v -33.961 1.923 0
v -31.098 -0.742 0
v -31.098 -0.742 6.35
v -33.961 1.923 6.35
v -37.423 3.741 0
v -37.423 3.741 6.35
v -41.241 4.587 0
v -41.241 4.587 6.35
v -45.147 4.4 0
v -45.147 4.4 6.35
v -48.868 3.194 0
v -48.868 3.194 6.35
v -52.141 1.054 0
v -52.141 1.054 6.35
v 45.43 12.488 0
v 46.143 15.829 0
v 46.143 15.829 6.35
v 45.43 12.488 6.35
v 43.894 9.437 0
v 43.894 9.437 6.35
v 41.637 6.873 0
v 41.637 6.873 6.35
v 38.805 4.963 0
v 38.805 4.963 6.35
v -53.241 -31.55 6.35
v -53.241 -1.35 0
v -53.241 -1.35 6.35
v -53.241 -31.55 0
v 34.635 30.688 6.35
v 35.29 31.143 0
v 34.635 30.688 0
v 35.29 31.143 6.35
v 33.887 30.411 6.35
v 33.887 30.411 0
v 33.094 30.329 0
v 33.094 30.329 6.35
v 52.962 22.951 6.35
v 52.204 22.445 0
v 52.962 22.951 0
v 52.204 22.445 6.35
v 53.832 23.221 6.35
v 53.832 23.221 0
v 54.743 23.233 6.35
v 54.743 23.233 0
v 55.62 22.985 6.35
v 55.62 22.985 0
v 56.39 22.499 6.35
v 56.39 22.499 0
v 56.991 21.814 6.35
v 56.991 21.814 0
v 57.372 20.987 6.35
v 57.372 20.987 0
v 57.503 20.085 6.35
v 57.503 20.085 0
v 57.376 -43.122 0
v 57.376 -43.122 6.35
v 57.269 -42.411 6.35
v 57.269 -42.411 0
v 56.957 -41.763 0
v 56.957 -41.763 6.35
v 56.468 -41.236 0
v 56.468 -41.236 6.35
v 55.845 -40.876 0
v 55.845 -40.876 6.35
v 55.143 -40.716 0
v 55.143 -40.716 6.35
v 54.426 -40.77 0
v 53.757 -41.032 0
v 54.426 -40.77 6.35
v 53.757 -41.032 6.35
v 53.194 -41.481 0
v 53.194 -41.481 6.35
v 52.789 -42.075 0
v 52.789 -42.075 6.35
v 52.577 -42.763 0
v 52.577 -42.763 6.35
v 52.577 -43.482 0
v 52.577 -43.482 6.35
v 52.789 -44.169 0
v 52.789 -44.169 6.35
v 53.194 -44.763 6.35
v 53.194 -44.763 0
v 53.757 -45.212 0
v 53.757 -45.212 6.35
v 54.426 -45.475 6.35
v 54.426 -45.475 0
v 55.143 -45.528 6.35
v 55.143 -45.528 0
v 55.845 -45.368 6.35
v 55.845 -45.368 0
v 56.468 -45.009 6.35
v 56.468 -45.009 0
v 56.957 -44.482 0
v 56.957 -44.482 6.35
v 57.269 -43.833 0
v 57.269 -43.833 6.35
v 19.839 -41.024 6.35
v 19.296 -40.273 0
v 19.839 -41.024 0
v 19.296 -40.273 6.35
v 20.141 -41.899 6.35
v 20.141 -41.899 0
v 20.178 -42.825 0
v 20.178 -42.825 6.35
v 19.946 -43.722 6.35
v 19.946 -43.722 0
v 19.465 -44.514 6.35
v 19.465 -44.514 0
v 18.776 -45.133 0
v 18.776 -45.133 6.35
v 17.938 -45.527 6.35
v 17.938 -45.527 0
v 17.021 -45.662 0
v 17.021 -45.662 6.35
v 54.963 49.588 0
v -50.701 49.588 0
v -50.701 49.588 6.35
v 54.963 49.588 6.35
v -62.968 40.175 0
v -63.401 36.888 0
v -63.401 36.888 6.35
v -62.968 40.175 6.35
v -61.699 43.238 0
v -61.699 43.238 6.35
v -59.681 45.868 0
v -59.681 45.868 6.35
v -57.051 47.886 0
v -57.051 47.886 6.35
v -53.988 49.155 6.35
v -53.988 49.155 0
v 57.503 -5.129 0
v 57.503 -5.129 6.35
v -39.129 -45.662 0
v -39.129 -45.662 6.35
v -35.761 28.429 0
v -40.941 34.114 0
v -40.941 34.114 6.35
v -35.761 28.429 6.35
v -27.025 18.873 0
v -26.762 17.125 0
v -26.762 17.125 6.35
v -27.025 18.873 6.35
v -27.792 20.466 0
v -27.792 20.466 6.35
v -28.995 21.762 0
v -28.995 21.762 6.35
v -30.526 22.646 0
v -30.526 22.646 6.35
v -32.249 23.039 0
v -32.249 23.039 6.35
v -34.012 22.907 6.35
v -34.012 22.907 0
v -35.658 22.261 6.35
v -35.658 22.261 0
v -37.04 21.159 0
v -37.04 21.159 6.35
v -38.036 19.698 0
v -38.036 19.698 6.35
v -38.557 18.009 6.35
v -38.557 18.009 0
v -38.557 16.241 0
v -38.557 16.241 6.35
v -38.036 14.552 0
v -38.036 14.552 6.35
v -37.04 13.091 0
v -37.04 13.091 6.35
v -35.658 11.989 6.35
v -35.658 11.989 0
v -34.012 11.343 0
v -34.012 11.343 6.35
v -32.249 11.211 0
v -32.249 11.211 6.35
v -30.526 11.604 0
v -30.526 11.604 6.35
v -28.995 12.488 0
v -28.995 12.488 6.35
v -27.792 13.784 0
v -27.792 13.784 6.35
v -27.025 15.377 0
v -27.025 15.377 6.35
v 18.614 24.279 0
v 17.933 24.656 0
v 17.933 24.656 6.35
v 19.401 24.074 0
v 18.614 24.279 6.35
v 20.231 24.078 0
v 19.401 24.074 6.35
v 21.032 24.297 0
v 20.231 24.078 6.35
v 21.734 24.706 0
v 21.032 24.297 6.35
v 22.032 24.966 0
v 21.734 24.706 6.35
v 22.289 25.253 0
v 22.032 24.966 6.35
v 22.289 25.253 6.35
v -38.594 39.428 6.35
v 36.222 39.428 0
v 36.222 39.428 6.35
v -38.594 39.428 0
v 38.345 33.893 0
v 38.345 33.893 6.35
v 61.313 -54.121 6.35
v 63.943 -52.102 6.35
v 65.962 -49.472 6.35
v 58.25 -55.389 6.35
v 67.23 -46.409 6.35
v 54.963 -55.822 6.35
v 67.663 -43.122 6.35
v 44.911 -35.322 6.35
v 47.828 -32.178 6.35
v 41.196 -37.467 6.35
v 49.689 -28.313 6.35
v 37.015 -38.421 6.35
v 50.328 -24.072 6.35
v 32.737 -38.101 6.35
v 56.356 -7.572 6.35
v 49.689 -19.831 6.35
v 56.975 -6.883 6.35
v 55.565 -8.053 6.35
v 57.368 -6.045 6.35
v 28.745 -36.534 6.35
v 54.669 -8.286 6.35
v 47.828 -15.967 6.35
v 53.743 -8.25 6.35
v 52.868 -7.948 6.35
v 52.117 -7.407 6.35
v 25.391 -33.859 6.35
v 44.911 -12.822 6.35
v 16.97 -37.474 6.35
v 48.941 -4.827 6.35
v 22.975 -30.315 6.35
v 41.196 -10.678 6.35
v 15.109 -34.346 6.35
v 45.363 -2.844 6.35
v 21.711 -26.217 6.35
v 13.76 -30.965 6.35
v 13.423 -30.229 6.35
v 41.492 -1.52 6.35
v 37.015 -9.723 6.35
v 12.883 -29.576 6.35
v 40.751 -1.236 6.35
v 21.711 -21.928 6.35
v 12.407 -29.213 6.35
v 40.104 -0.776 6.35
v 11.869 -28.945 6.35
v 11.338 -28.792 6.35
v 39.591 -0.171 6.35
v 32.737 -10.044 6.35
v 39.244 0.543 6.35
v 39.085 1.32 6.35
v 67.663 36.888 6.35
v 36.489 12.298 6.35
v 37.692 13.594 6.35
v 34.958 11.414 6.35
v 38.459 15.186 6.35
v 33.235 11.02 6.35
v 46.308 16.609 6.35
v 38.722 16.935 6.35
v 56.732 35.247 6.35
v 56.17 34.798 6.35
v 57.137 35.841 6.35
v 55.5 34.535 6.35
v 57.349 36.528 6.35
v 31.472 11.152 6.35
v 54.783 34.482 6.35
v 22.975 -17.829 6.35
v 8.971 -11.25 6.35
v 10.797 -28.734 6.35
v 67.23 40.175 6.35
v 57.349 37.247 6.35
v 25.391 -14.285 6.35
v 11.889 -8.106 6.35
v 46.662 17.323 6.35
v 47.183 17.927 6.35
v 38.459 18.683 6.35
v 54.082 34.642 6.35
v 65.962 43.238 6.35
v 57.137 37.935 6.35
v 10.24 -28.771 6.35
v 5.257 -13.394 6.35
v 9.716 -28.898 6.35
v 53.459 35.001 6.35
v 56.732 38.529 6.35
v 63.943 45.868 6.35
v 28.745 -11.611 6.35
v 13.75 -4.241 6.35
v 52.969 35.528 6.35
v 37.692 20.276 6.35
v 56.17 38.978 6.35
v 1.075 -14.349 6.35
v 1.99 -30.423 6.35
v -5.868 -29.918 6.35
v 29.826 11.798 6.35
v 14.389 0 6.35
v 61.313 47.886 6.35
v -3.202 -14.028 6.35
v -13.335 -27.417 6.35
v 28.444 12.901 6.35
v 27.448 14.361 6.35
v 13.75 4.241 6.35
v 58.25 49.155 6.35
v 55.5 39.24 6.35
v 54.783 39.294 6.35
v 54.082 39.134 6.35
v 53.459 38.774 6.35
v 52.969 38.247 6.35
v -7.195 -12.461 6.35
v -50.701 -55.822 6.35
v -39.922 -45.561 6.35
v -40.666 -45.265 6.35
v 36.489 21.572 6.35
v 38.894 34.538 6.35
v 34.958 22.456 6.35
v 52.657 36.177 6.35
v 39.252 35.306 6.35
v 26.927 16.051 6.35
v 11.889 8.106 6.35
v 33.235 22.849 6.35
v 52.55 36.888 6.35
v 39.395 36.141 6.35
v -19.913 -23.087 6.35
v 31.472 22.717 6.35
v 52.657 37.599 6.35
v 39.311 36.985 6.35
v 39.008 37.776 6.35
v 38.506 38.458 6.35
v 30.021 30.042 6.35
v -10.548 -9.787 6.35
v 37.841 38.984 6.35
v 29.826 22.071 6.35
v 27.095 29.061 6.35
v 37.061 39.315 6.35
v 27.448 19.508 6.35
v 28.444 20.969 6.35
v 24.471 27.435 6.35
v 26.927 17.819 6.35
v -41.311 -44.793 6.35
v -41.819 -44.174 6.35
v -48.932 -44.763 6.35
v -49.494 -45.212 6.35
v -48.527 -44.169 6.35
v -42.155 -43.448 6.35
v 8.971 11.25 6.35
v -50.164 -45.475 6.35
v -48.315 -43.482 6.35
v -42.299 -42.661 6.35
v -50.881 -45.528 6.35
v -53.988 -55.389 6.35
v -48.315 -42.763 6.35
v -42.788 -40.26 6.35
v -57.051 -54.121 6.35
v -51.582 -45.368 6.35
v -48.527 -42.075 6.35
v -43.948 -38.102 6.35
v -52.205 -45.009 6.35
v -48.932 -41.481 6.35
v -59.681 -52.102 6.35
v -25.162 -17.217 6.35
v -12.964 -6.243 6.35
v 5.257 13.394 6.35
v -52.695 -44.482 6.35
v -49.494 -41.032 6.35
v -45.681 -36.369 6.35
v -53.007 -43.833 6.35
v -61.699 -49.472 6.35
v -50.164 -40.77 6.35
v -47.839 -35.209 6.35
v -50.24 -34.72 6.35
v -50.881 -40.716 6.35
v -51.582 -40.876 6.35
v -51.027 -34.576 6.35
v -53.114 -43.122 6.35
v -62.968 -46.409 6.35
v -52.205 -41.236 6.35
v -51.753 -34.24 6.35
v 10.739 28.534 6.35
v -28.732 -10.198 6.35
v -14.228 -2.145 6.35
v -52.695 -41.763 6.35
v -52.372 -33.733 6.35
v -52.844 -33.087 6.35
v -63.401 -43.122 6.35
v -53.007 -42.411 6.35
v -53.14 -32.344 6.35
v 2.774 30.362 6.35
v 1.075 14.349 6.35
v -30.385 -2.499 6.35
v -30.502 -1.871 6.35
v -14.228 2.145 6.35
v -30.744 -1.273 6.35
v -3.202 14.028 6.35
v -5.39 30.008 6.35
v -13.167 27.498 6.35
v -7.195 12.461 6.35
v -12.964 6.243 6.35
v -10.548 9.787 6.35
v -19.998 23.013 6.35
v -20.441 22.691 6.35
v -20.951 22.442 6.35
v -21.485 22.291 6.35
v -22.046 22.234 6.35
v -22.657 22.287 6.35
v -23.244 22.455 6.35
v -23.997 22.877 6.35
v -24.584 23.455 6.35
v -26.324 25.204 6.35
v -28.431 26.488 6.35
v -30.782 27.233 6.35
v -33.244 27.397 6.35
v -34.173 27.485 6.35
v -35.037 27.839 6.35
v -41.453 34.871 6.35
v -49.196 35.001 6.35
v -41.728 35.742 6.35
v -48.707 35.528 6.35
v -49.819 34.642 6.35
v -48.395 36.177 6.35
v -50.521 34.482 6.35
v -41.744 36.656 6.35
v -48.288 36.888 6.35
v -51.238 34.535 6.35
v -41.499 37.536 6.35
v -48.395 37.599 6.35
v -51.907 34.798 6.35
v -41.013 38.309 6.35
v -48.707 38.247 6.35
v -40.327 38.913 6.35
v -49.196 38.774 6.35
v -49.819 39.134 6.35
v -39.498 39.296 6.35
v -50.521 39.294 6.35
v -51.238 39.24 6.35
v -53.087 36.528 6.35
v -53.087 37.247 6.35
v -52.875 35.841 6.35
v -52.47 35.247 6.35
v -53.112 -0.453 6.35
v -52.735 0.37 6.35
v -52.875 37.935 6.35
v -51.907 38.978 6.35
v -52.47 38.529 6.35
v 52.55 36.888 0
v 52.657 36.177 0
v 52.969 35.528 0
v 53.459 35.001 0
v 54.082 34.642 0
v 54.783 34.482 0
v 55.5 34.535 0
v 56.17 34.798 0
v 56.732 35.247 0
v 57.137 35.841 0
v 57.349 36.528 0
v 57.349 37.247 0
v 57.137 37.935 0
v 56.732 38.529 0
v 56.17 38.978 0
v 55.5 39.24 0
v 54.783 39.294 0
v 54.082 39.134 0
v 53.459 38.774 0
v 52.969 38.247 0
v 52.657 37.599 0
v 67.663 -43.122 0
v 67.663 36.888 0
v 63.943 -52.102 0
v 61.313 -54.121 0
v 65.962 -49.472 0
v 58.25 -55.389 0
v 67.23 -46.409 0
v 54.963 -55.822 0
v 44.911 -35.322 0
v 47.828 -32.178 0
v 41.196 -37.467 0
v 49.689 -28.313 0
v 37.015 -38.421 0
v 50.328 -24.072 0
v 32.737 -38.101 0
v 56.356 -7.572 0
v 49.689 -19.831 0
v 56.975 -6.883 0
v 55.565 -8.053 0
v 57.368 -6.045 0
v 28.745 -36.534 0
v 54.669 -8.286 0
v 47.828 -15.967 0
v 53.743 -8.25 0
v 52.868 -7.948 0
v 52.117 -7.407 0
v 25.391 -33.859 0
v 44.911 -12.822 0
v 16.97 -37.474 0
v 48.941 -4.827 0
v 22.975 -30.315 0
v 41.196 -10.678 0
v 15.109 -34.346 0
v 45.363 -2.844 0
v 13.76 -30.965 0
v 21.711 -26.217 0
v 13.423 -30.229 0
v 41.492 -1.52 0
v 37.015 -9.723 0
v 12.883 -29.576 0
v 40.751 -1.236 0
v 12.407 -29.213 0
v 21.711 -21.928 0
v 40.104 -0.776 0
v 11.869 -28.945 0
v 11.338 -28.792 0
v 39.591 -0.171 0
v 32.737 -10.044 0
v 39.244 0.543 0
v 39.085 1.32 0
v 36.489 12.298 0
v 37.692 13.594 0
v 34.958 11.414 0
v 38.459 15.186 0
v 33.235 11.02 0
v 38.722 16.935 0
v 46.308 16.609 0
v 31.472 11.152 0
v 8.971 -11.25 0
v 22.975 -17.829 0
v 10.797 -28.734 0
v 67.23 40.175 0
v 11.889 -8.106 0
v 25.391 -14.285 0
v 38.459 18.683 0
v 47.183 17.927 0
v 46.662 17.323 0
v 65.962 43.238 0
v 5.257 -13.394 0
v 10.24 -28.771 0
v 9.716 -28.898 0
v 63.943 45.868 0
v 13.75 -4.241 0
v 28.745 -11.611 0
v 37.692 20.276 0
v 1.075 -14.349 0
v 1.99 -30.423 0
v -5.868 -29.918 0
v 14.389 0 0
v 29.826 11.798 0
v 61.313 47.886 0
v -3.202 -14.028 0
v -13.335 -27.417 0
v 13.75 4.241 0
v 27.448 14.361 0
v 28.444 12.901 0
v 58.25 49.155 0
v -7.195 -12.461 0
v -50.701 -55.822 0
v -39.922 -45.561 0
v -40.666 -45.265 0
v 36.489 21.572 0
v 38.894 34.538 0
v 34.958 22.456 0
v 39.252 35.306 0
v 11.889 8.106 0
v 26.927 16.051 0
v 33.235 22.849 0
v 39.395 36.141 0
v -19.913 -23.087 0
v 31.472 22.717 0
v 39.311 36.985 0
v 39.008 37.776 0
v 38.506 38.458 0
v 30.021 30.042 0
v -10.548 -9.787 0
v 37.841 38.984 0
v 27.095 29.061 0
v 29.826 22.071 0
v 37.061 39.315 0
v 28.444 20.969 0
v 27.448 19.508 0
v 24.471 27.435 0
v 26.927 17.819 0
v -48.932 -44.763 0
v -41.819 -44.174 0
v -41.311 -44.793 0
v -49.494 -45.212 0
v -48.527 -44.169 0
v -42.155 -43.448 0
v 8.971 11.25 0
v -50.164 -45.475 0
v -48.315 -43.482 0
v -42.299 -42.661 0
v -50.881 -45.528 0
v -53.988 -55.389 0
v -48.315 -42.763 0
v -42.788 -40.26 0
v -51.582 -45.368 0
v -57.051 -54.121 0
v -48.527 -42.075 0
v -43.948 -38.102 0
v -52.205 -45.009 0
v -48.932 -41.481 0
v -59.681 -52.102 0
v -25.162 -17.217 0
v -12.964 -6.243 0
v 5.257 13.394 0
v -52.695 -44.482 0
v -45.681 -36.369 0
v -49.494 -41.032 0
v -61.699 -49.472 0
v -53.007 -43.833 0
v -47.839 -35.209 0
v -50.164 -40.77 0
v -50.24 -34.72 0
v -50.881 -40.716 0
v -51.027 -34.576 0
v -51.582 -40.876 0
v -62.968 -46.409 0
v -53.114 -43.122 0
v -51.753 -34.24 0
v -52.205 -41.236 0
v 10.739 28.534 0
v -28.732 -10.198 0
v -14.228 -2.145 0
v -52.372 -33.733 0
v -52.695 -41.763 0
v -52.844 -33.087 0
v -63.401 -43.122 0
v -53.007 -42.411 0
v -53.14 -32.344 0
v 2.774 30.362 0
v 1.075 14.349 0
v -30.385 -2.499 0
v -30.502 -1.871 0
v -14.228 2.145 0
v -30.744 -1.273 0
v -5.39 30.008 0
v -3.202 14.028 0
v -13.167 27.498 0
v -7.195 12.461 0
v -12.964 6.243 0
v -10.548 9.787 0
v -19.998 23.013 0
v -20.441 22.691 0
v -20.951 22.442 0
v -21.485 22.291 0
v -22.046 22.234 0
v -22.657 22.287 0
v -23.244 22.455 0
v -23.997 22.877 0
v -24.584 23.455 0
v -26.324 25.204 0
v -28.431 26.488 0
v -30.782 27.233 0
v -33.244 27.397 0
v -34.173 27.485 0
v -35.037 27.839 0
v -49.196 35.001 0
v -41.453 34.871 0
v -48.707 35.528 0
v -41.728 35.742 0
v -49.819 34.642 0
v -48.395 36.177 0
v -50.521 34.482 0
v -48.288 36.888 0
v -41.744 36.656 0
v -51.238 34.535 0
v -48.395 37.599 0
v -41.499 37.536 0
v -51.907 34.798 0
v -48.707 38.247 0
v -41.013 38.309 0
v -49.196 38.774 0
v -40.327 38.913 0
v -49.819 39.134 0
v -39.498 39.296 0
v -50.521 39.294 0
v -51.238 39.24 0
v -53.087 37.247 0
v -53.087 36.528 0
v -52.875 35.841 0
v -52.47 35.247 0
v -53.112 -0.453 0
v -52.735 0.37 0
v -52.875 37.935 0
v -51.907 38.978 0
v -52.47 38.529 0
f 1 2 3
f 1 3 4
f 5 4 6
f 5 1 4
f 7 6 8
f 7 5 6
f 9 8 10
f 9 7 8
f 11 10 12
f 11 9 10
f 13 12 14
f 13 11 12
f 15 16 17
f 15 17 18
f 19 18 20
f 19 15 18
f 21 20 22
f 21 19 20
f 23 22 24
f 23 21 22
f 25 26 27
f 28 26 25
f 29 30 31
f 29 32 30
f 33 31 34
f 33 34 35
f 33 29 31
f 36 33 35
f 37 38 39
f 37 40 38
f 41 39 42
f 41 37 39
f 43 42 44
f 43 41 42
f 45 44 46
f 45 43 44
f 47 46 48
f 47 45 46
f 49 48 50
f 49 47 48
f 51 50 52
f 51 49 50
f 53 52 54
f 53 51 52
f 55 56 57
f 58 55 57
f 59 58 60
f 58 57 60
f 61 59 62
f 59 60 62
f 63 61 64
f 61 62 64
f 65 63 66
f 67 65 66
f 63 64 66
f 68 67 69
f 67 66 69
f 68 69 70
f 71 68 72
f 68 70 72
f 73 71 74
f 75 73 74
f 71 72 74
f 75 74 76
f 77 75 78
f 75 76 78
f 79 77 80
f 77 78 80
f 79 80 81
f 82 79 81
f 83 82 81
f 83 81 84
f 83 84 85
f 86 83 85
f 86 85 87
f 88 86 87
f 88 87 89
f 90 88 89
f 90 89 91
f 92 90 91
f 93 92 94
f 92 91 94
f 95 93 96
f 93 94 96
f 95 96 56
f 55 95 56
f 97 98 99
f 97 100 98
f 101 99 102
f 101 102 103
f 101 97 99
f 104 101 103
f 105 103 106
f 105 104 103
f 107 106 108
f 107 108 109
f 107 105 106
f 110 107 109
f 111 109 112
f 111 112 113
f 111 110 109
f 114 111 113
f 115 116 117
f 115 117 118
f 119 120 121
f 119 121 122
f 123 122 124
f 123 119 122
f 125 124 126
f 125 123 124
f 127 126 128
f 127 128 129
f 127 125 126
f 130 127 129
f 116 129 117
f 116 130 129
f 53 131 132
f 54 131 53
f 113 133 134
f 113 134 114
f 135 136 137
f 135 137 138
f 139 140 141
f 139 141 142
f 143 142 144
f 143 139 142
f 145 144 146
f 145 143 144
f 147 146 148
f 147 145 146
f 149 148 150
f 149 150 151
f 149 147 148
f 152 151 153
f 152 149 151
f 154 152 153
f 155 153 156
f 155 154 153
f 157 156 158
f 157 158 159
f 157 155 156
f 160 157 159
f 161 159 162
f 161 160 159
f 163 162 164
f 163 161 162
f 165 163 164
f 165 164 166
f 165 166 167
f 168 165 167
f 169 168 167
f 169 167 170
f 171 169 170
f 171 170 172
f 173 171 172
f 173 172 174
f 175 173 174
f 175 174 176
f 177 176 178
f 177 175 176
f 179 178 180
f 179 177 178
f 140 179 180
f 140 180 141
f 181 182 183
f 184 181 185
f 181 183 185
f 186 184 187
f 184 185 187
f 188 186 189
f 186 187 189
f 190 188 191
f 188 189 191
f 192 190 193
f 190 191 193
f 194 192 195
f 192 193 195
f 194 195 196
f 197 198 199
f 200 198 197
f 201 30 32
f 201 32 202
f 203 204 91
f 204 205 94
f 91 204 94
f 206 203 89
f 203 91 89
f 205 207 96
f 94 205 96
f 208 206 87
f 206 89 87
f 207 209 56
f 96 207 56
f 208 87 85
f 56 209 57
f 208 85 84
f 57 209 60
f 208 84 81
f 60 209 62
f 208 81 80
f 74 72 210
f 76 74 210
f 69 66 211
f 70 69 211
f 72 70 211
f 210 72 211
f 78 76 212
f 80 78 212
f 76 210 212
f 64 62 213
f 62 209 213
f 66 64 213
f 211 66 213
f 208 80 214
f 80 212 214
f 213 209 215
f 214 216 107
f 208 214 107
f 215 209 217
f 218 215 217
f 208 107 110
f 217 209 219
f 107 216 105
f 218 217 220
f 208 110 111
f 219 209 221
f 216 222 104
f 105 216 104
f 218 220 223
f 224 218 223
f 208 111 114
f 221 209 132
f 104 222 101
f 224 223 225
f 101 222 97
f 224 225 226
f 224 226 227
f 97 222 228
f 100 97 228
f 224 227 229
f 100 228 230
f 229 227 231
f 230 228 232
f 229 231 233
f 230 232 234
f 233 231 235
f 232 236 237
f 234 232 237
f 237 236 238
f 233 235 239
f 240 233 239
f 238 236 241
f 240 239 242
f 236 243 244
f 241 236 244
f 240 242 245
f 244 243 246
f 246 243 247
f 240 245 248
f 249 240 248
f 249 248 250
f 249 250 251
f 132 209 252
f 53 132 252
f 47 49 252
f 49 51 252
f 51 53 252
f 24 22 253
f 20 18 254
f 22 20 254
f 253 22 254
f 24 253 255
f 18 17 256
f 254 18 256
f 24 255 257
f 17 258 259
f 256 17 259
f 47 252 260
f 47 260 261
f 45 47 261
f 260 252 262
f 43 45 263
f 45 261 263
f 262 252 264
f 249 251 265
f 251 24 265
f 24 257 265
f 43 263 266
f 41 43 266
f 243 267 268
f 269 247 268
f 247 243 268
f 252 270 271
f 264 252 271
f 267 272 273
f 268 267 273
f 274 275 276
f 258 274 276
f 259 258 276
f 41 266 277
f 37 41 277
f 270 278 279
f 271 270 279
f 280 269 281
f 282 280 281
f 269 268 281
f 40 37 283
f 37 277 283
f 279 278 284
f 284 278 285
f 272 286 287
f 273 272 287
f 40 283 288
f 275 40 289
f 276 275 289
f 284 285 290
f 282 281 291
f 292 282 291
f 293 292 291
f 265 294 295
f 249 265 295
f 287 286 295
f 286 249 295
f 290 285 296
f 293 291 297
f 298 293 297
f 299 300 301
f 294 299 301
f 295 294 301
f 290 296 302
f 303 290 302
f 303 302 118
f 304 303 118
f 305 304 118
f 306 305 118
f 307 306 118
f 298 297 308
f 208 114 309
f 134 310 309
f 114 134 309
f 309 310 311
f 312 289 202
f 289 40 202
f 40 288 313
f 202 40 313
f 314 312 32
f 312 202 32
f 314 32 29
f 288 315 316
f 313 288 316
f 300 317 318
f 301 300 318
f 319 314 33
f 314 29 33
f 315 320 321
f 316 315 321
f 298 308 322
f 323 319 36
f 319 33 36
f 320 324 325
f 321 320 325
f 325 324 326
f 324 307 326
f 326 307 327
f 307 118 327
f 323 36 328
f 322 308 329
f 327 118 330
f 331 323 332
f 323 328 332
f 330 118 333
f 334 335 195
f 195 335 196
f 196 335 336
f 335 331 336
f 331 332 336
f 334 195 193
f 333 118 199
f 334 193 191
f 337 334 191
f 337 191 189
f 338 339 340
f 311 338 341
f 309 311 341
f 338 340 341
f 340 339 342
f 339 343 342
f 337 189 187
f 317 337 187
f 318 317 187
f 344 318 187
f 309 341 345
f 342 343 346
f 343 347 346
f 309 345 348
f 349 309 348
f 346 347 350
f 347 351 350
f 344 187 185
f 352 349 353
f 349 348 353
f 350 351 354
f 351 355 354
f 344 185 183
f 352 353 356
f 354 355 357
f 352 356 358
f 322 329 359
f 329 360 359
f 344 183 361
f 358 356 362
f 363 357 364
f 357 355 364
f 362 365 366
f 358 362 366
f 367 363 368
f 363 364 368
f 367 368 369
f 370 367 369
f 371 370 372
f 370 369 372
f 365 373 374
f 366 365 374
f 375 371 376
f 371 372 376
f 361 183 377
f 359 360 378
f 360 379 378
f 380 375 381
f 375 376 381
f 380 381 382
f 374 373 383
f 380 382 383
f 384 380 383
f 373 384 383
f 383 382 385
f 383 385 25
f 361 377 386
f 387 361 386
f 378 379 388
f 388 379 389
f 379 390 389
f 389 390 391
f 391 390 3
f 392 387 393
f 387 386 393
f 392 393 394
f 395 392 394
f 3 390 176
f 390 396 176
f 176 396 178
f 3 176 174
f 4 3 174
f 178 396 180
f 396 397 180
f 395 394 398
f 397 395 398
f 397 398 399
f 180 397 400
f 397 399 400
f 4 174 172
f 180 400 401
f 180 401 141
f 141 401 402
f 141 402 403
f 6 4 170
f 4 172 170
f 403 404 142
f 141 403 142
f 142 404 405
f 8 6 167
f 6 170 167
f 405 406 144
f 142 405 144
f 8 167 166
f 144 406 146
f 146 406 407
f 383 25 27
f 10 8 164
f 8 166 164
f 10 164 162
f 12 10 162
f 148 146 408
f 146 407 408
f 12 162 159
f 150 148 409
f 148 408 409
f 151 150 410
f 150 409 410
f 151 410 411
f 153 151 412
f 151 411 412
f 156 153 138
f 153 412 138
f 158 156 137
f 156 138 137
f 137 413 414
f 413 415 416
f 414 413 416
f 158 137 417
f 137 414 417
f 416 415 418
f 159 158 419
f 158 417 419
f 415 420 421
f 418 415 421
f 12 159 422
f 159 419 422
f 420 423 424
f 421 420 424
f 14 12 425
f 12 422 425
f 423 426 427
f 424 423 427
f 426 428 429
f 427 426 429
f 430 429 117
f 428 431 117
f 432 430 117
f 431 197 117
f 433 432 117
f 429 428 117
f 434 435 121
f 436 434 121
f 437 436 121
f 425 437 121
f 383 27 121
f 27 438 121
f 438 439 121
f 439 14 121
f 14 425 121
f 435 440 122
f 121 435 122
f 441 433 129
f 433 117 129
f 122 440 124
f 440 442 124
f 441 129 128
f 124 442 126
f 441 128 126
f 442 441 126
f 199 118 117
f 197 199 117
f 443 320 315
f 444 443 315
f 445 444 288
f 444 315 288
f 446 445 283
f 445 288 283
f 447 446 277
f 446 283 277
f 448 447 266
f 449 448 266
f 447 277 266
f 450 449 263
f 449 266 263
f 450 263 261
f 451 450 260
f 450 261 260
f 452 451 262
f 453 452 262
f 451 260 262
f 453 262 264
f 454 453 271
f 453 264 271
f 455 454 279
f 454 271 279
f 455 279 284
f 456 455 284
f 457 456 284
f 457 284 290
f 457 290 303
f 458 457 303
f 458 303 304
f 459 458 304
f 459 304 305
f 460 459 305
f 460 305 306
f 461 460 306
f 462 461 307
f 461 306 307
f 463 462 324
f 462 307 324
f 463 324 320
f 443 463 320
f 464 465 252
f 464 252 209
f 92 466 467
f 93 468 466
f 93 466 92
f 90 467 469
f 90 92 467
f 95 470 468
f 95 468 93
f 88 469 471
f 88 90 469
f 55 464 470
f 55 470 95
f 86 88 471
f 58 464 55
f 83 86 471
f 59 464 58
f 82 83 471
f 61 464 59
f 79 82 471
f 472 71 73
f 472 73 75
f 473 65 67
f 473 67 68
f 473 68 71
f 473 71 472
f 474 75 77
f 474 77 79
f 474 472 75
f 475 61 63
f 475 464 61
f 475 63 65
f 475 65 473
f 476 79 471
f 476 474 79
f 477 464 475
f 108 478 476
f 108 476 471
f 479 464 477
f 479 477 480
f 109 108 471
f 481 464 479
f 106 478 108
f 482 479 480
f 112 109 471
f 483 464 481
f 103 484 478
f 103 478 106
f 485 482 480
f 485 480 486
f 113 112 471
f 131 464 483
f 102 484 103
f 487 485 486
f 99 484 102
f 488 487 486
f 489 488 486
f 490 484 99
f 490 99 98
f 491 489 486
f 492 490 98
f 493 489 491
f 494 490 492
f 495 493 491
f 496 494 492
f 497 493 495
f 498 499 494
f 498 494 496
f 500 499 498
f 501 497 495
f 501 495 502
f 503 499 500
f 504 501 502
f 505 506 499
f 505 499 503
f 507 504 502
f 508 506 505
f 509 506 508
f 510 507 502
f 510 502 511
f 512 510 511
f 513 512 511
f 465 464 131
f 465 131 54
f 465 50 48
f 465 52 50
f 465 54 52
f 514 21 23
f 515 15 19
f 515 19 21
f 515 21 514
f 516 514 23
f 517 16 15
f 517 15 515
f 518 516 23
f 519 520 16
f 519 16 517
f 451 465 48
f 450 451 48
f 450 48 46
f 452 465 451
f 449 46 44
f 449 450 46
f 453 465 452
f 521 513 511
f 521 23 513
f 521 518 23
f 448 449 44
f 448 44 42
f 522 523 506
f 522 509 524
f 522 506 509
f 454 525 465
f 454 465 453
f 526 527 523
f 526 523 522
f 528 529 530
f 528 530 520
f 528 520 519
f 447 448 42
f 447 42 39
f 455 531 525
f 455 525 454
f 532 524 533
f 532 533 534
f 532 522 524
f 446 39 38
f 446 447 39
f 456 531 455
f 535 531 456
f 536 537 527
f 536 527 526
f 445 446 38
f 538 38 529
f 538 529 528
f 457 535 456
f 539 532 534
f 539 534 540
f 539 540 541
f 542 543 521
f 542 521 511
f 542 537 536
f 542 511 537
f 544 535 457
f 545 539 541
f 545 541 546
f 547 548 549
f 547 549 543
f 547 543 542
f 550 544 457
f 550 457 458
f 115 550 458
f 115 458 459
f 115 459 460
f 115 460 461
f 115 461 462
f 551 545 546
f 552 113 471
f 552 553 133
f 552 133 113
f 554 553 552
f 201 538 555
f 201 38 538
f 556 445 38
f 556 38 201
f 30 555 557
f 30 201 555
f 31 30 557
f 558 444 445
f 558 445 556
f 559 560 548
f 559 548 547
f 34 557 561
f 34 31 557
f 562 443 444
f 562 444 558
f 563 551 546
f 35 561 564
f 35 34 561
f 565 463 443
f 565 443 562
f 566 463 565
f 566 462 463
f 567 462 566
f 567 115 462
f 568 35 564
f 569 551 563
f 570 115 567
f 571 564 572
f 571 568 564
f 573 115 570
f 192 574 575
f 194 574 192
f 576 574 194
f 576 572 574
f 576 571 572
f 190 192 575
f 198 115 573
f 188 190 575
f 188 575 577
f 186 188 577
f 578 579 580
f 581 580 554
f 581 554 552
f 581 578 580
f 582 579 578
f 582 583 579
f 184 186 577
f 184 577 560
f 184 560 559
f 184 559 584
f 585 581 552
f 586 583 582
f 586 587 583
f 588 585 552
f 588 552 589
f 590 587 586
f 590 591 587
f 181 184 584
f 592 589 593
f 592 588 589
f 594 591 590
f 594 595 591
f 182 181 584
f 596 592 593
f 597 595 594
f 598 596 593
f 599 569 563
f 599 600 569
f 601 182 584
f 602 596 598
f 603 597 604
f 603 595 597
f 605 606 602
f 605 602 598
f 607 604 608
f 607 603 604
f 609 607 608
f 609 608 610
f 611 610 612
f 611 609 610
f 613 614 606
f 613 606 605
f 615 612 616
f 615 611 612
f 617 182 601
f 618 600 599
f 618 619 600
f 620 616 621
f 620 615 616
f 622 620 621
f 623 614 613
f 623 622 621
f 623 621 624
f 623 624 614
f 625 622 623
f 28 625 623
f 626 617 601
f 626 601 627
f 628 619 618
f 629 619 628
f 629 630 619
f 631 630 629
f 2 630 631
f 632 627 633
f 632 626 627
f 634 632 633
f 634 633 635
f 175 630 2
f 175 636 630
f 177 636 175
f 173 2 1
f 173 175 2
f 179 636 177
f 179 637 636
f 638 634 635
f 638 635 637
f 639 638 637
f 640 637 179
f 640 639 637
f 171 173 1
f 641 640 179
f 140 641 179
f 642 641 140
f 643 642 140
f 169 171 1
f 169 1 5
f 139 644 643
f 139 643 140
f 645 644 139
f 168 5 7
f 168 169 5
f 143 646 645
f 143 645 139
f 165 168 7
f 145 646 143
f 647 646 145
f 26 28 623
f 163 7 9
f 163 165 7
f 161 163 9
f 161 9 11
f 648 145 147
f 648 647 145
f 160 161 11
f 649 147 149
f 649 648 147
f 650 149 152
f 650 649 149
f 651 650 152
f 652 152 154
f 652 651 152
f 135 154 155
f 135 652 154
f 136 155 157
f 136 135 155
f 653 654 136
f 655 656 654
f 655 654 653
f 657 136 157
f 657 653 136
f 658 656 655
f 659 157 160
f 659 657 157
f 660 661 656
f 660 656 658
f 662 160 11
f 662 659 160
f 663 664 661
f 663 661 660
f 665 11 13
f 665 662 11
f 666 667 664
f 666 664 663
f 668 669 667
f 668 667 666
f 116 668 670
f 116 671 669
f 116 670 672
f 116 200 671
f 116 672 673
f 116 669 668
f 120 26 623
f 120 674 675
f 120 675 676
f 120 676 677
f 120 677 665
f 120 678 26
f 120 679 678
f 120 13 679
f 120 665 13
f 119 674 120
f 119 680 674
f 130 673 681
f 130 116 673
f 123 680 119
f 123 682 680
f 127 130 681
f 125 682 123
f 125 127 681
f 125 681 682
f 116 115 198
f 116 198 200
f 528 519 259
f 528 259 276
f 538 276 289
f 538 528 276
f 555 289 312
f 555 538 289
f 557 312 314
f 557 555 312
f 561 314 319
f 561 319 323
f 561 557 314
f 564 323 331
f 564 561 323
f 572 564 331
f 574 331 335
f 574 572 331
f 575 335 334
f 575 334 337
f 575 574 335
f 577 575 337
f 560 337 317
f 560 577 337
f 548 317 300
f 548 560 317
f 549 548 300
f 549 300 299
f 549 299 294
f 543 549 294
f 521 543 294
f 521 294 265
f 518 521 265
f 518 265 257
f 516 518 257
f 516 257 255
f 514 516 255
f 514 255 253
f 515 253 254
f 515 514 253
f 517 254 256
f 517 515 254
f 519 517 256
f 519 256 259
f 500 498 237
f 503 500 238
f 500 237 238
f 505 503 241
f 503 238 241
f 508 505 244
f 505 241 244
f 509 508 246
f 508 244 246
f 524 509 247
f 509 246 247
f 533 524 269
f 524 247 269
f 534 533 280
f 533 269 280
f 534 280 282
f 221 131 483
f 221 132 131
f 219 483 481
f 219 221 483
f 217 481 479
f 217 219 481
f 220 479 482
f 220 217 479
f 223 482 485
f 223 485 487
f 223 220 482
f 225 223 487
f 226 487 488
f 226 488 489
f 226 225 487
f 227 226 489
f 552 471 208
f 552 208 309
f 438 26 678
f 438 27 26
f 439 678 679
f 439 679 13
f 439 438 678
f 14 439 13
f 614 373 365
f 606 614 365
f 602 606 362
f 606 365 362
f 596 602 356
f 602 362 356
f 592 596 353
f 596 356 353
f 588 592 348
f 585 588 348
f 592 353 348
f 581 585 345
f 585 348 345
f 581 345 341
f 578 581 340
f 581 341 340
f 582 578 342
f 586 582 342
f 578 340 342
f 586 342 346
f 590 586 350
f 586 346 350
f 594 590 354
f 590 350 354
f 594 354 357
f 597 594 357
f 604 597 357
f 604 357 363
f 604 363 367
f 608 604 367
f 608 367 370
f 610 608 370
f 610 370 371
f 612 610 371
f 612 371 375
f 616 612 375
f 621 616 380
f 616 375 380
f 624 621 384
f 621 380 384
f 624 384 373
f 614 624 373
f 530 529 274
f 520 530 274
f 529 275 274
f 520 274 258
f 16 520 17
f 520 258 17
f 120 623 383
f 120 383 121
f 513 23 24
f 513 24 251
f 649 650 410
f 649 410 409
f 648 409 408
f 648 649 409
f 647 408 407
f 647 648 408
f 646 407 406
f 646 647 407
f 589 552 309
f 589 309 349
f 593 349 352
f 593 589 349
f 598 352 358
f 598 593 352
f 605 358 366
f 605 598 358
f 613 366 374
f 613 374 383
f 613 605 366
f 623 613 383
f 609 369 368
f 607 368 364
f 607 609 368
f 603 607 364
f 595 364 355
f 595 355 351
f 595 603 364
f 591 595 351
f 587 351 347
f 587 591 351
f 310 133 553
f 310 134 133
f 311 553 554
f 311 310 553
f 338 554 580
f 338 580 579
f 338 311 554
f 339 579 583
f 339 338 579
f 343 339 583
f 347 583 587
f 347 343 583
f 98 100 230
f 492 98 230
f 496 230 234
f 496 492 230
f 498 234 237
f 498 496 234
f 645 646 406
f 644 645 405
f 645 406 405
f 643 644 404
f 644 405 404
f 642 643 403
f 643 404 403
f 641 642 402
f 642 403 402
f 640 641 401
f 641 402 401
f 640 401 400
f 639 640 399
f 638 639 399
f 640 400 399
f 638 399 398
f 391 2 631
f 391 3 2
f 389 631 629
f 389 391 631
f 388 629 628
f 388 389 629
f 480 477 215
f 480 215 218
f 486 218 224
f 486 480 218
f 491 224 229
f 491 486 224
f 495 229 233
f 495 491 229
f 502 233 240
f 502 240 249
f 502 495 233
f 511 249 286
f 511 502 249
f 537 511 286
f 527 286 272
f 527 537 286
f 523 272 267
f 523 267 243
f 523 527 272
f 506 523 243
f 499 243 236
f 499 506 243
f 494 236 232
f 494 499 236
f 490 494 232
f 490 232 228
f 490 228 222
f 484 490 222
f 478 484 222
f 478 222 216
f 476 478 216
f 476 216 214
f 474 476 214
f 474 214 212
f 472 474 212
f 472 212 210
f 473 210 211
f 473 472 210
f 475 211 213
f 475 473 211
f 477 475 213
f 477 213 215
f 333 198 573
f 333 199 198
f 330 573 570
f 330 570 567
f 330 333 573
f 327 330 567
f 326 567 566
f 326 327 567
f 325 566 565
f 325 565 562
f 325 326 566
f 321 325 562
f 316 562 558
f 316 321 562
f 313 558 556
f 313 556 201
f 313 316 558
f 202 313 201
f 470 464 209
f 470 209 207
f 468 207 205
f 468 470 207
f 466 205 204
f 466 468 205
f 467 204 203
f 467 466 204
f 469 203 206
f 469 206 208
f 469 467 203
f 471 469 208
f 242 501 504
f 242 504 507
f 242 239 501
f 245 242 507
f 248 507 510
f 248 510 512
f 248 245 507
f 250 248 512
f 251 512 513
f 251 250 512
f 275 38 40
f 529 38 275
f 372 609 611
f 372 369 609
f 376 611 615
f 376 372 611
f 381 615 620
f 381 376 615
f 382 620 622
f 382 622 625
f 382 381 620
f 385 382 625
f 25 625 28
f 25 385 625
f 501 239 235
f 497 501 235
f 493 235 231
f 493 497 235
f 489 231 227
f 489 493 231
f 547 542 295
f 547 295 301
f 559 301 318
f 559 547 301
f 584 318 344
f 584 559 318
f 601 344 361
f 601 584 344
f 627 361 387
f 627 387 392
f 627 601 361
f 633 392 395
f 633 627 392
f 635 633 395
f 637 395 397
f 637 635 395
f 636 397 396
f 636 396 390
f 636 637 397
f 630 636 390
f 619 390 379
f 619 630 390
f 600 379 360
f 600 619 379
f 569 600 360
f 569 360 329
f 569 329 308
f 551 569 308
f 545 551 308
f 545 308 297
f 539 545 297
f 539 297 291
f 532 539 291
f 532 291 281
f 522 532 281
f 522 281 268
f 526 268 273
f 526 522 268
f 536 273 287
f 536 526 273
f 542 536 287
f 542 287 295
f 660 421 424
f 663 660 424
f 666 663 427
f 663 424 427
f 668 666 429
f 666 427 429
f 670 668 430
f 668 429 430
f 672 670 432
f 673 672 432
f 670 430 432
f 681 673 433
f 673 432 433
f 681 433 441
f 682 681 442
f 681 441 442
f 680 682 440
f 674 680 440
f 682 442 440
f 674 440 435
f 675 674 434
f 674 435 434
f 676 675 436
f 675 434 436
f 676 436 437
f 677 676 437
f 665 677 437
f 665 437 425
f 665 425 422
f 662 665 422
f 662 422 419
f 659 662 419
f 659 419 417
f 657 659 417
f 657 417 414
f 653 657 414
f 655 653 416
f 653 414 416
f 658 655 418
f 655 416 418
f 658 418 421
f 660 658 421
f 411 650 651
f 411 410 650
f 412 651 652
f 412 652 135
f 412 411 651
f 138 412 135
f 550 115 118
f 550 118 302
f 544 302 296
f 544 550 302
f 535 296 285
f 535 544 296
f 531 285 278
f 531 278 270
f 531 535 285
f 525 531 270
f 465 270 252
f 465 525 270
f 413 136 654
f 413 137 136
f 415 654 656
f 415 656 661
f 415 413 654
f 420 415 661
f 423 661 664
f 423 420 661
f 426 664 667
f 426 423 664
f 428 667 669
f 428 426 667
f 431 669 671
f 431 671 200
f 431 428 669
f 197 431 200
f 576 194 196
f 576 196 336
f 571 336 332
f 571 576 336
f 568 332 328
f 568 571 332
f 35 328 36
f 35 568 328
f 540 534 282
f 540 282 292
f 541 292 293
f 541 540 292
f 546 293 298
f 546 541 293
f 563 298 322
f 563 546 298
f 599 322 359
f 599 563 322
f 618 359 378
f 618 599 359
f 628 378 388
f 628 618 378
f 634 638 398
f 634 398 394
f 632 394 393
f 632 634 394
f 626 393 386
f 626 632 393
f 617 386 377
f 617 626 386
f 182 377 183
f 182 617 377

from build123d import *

# Parameters (mm, degrees)
SKETCH1_R           = 14.3891
SKETCH1_R_2         = 5.9309
BOSS_EXTRUDE2_DEPTH = 6.35
SKETCH2_R           = 2.413
CUT_EXTRUDE1_DEPTH  = 6.35
CUT_EXTRUDE6_DEPTH  = 25.4
FILLET4_R           = 3.175
FILLET6_R           = 3.175
FILLET5_R           = 3.175


with BuildPart() as part:
    # Sketch1 → Boss-Extrude2 (new body)
    with BuildSketch(Plane.XY):
        with BuildLine():
            Line((54.963119593, 49.587781591), (-50.700880407, 49.587781591))
            ThreePointArc((-50.700880407, 49.587781591), (-59.681136528, 45.868037712), (-63.400880407, 36.887781591))
            Line((-63.400880407, 36.887781591), (-63.400880407, -43.122218409))
            ThreePointArc((-63.400880407, -43.122218409), (-59.681136528, -52.10247453), (-50.700880407, -55.822218409))
            Line((-50.700880407, -55.822218409), (54.963119593, -55.822218409))
            ThreePointArc((54.963119593, -55.822218409), (63.943375714, -52.10247453), (67.663119593, -43.122218409))
            Line((67.663119593, -43.122218409), (67.663119593, 36.887781591))
            ThreePointArc((67.663119593, 36.887781591), (63.943375714, 45.868037712), (54.963119593, 49.587781591))
        make_face()
        with Locations((35.939214506, -24.072218409)):
            Circle(SKETCH1_R, mode=Mode.SUBTRACT)
        with Locations((-32.69260882, 17.124862832)):
            Circle(SKETCH1_R_2, mode=Mode.SUBTRACT)
        Circle(SKETCH1_R, mode=Mode.SUBTRACT)
        with Locations((32.791546632, 16.934641063)):
            Circle(SKETCH1_R_2, mode=Mode.SUBTRACT)
    extrude(amount=BOSS_EXTRUDE2_DEPTH)

    # Sketch2 → Cut-Extrude1 (cut)
    with BuildSketch(Plane.XY.offset(6.35)):
        with Locations((-50.700880407, 36.887781591)):
            Circle(SKETCH2_R)
        with Locations((54.963119593, 36.887781591)):
            Circle(SKETCH2_R)
        with Locations((54.963119593, -43.122218409)):
            Circle(SKETCH2_R)
        with Locations((-50.700880407, -43.122218409)):
            Circle(SKETCH2_R)
    extrude(amount=-CUT_EXTRUDE1_DEPTH, mode=Mode.SUBTRACT)

    # Sketch3 → Cut-Extrude6 (cut)
    with BuildSketch(Plane.XY.offset(6.35)):
        with BuildLine():
            ThreePointArc((-22.865276921, 20.166764197), (-1.620277869, 30.444933347), (20.595631427, 22.479751622))
            ThreePointArc((20.595631427, 22.479751622), (26.18341036, 28.588873504), (34.294760977, 30.247377274))
            Line((34.294760977, 30.247377274), (44.495862095, 39.427781591))
            Line((44.495862095, 39.427781591), (-45.782707456, 39.427781591))
            Line((-45.782707456, 39.427781591), (-34.660782298, 27.22218472))
            ThreePointArc((-34.660782298, 27.22218472), (-27.411857693, 25.953412186), (-22.865276921, 20.166764197))
        make_face()
        with BuildLine():
            ThreePointArc((27.37738958, -45.662218409), (17.771598796, -38.541865449), (12.980930477, -27.58649508))
            ThreePointArc((12.980930477, -27.58649508), (-15.657094436, -26.160555435), (-30.44625116, -1.595323538))
            ThreePointArc((-30.44625116, -1.595323538), (-41.465480232, 4.60457782), (-53.240880407, 0))
            Line((-53.240880407, 0), (-53.240880407, -35.100222849))
            ThreePointArc((-53.240880407, -35.100222849), (-44.750921888, -37.17225989), (-42.678884848, -45.662218409))
            Line((-42.678884848, -45.662218409), (27.37738958, -45.662218409))
        make_face()
        with BuildLine():
            ThreePointArc((46.188533959, 17.031229414), (44.21986427, 9.94306365), (38.805433181, 4.962934111))
            Line((38.805433181, 4.962934111), (39.269790063, -1.08656609))
            ThreePointArc((39.269790063, -1.08656609), (50.308421041, -5.825058365), (57.503119593, -15.444881422))
            Line((57.503119593, -15.444881422), (57.503119593, 27.213705757))
            Line((57.503119593, 27.213705757), (46.188533959, 17.031229414))
        make_face()
    extrude(amount=-CUT_EXTRUDE6_DEPTH, mode=Mode.SUBTRACT)

    # Fillet4
    fillet4_edges = [part.edges().sort_by_distance(p)[0] for p in [
        (57.503119593, 27.213705757, 3.175),
        (44.495862095, 39.427781591, 3.175),
        (46.188533959, 17.031229414, 3.175),
        (-45.782707456, 39.427781591, 3.175),
        (39.269790063, -1.08656609, 3.175),
        (34.294760977, 30.247377274, 3.175),
        (-34.660782298, 27.22218472, 3.175),
        (-22.865276921, 20.166764197, 3.175),
        (57.503119593, -15.444881422, 3.175),
    ]]
    fillet(fillet4_edges, radius=FILLET4_R)

    # Fillet6
    fillet6_edges = [part.edges().sort_by_distance(p)[0] for p in [
        (20.595631427, 22.479751622, 3.175),
    ]]
    fillet(fillet6_edges, radius=FILLET6_R)

    # Fillet5
    fillet5_edges = [part.edges().sort_by_distance(p)[0] for p in [
        (27.37738958, -45.662218409, 3.175),
        (12.980930477, -27.58649508, 3.175),
        (-30.44625116, -1.595323538, 3.175),
        (-53.240880407, 0, 3.175),
        (-42.678884848, -45.662218409, 3.175),
        (-53.240880407, -35.100222849, 3.175),
    ]]
    fillet(fillet5_edges, radius=FILLET5_R)


solid = part.part
